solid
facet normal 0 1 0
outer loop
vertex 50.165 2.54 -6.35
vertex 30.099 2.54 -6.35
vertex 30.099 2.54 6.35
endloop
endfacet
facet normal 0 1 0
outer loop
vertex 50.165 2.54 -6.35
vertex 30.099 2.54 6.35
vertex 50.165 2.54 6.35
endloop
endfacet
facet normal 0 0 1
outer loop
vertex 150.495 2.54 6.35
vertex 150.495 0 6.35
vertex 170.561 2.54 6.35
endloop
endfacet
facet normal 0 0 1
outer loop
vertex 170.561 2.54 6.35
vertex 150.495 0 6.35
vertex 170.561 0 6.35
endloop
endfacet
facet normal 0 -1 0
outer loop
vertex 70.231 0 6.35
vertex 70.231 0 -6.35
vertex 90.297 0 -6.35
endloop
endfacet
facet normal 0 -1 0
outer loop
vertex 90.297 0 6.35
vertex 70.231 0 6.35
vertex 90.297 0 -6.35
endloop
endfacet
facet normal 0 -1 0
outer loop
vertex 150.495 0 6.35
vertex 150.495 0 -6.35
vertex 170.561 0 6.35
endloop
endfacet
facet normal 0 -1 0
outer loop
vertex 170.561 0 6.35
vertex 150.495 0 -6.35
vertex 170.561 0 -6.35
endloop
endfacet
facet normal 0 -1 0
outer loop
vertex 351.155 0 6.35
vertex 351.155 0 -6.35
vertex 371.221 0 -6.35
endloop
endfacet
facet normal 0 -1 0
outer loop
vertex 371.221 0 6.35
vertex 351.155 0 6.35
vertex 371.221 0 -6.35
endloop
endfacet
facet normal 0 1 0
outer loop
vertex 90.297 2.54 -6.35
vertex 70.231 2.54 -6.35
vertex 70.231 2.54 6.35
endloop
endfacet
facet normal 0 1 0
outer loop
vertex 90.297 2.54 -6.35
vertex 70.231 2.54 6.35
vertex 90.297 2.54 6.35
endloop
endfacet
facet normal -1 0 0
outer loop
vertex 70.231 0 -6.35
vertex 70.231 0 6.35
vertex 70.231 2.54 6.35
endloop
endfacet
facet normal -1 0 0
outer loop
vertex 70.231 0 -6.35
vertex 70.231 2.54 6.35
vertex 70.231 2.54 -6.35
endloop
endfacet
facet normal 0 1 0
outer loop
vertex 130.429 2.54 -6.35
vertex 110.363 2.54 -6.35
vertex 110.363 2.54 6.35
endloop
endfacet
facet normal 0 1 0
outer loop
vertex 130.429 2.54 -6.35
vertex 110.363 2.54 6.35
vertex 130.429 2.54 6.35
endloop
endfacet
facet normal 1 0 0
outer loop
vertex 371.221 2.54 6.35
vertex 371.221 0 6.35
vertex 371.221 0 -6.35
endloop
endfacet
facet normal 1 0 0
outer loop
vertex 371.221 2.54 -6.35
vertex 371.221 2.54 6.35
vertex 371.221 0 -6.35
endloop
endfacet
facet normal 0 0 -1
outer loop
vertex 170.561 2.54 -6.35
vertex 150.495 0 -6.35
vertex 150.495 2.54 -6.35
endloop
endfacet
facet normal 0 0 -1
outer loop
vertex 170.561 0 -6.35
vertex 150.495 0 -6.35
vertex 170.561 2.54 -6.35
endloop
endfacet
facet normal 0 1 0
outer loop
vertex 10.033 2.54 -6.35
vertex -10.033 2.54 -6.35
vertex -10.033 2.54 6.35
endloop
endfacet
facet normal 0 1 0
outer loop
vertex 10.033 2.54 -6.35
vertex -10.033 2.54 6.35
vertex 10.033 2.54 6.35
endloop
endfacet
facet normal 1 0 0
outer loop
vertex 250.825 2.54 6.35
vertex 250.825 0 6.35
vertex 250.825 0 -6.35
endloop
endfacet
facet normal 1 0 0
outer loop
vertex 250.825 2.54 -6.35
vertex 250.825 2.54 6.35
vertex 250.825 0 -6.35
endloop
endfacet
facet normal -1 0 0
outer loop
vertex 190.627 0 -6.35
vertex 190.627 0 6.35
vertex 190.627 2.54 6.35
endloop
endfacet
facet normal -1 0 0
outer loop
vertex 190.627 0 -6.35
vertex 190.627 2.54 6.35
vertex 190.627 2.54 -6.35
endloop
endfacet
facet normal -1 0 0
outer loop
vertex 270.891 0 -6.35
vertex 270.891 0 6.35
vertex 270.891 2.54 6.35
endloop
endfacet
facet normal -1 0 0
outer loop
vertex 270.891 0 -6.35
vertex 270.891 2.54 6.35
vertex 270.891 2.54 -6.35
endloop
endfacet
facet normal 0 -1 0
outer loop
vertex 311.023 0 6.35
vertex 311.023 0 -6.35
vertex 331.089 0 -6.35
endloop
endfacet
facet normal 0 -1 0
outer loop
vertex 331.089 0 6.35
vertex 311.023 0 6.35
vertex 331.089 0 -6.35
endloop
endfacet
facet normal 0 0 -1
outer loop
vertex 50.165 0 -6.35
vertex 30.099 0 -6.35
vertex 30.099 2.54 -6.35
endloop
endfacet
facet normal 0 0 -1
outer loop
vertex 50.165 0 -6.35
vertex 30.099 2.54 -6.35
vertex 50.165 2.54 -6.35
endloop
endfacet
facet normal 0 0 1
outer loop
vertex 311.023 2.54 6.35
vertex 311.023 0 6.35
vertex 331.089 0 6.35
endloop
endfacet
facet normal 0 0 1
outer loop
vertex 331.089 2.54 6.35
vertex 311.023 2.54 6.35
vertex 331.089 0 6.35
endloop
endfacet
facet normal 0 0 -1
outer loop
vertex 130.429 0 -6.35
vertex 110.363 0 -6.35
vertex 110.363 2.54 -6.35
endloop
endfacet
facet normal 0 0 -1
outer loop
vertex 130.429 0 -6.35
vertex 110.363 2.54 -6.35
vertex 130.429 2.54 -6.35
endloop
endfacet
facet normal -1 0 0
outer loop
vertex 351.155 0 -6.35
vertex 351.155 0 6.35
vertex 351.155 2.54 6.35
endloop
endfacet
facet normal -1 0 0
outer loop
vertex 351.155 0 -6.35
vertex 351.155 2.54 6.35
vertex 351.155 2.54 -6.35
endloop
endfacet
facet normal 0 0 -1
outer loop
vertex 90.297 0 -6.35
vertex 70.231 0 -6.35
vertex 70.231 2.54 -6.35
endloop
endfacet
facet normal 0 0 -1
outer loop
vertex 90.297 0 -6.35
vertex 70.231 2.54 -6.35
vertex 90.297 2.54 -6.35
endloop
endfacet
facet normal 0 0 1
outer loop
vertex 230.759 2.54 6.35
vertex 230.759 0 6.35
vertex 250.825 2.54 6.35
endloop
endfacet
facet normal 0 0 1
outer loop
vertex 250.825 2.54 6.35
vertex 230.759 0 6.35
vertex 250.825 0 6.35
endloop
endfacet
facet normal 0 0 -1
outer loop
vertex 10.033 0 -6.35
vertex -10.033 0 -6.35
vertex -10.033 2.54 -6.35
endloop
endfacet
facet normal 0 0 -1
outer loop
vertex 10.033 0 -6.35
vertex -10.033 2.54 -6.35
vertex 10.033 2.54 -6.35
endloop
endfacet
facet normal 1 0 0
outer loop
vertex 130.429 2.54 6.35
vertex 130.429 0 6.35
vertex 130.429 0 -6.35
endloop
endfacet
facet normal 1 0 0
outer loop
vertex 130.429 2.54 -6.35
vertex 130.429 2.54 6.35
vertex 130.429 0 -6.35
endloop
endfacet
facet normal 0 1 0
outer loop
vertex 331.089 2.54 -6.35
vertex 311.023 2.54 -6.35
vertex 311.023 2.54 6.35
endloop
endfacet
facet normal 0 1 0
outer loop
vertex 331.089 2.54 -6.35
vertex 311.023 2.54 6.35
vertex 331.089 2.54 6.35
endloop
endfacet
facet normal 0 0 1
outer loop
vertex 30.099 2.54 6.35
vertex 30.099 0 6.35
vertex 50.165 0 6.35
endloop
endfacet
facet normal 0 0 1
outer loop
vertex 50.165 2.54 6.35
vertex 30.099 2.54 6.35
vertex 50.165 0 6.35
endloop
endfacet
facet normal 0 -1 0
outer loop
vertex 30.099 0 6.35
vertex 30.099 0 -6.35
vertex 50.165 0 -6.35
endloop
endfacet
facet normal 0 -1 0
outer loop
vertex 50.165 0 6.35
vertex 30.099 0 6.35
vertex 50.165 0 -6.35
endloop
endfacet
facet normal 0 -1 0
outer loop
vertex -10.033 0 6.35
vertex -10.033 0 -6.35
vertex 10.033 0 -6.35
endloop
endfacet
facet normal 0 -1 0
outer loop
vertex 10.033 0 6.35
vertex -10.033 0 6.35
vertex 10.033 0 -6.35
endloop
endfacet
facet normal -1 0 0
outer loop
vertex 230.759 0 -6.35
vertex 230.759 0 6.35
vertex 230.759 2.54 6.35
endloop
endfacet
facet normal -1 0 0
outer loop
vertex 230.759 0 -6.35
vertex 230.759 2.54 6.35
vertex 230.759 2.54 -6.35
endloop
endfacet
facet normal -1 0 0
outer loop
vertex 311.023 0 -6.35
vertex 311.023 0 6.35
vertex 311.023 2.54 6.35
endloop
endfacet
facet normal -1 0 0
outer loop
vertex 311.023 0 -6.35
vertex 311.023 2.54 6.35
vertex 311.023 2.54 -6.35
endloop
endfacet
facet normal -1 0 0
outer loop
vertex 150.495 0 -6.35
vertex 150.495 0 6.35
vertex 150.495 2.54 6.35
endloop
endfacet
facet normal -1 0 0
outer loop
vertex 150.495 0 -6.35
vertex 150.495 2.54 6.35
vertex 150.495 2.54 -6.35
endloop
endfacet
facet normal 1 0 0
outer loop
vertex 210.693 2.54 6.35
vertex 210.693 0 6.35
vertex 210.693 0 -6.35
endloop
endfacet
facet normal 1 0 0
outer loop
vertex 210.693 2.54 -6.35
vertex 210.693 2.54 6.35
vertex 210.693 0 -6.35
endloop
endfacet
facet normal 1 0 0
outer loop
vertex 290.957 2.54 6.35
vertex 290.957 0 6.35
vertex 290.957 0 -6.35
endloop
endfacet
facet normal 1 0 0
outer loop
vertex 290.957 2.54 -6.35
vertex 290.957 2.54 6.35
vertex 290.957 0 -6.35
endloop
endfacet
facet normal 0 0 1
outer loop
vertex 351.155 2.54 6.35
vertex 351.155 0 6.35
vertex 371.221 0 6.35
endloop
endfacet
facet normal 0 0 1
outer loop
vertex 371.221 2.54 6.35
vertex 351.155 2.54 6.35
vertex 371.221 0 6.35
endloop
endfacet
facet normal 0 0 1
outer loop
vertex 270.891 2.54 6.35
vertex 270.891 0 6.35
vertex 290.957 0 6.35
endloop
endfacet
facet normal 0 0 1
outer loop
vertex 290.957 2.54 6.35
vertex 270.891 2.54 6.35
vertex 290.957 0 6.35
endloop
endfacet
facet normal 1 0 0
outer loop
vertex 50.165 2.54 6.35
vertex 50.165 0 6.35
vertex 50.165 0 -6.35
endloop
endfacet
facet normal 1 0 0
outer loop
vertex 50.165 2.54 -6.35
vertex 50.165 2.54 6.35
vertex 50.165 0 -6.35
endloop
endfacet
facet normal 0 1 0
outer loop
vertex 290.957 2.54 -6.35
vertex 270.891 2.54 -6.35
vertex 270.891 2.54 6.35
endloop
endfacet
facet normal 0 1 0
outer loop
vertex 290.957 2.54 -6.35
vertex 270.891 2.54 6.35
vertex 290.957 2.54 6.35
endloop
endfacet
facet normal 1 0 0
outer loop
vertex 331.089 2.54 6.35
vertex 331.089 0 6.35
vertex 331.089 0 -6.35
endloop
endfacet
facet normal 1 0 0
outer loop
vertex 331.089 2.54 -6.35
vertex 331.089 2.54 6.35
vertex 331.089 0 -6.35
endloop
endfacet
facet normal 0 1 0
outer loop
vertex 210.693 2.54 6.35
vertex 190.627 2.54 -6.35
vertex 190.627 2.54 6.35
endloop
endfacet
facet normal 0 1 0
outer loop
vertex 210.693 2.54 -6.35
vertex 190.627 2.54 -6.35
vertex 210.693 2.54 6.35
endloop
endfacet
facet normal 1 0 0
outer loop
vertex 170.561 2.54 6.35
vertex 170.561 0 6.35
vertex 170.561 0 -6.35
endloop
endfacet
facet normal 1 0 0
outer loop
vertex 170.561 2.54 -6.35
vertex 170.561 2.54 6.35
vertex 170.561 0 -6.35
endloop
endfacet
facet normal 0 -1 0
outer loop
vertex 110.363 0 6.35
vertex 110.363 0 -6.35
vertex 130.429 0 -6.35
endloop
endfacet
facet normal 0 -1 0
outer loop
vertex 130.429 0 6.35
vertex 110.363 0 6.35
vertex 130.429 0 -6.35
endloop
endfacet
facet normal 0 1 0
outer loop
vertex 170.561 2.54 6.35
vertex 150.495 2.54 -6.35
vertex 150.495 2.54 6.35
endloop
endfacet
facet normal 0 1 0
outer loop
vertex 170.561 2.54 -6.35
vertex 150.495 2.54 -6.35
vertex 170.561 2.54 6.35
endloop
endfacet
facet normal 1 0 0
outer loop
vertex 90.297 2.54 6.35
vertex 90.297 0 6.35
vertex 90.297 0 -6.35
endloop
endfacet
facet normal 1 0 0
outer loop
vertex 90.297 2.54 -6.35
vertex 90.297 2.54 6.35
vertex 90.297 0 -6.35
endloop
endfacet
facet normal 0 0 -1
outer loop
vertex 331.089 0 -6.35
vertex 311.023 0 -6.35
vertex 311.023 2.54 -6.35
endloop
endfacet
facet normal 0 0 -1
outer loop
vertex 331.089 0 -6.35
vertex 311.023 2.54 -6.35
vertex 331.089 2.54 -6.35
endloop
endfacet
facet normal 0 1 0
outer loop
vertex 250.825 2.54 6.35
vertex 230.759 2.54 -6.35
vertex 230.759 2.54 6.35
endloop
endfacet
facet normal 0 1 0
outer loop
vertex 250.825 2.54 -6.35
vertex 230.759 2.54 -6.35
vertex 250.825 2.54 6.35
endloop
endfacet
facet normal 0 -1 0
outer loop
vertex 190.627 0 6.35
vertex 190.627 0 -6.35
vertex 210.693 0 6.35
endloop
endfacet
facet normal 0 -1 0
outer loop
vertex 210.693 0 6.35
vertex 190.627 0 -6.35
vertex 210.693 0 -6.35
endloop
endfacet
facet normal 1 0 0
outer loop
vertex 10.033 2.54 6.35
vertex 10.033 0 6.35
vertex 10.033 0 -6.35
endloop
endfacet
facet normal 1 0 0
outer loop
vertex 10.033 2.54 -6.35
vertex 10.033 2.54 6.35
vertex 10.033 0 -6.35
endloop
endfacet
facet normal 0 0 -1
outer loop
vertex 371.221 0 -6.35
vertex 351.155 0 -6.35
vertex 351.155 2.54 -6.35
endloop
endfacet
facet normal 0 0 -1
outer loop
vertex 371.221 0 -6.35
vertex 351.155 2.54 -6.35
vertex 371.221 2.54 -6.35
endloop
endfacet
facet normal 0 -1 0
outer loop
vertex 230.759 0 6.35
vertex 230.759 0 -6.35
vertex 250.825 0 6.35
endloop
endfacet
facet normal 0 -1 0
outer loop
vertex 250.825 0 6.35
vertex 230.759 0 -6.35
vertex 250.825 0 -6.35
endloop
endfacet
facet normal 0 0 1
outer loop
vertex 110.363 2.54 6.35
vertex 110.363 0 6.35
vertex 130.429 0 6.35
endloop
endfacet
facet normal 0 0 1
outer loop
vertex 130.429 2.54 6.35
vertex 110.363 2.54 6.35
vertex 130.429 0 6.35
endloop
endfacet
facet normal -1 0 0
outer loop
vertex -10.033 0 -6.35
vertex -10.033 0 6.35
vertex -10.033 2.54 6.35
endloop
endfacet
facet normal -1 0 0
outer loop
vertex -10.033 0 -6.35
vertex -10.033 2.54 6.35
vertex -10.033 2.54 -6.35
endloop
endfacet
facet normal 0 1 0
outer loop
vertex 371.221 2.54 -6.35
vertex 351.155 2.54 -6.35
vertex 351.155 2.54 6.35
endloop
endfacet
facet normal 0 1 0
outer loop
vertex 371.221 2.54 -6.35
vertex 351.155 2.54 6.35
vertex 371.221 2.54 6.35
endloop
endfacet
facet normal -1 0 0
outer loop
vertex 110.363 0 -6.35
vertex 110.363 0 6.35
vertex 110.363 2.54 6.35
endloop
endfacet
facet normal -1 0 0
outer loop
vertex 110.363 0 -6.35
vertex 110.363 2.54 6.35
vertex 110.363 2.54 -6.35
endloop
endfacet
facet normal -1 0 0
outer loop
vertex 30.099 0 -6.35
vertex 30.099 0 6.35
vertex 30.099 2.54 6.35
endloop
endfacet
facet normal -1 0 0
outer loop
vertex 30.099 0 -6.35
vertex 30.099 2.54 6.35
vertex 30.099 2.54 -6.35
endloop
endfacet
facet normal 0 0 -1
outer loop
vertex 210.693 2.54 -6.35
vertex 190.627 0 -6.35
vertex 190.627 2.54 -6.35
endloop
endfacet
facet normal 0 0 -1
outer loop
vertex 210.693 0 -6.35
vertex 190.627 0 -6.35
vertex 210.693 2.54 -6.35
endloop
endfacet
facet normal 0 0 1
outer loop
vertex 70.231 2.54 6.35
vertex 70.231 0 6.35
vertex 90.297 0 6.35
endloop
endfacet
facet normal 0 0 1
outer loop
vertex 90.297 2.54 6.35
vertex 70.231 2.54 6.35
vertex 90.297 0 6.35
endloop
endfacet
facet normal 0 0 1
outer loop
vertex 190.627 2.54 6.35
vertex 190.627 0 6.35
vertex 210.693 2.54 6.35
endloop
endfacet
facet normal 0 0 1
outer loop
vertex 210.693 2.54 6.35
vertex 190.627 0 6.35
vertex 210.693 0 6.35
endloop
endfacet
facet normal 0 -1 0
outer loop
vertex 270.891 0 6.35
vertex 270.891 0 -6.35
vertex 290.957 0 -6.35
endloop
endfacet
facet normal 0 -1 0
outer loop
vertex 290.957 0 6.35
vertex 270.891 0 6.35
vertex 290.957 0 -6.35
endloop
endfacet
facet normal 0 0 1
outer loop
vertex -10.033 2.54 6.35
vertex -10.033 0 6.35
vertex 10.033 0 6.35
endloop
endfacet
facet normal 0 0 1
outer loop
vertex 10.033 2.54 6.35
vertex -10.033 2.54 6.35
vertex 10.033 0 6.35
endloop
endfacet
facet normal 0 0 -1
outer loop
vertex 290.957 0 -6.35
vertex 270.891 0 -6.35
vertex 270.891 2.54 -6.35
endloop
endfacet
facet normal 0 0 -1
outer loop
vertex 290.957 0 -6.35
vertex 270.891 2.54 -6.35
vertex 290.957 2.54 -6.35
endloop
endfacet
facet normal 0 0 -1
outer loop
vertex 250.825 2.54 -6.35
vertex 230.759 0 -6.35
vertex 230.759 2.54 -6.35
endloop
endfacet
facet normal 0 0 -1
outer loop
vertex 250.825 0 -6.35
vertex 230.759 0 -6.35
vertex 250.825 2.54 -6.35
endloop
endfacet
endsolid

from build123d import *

# Parameters (mm, degrees)
SKETCH1_W              = 20.066
SKETCH1_H              = 12.7
BOSS_EXTRUDE1_DEPTH    = 2.54
BOSS_EXTRUDE1_2_DEPTH  = 2.54
BOSS_EXTRUDE1_3_DEPTH  = 2.54
BOSS_EXTRUDE1_4_DEPTH  = 2.54
BOSS_EXTRUDE1_5_DEPTH  = 2.54
BOSS_EXTRUDE1_6_DEPTH  = 2.54
BOSS_EXTRUDE1_7_DEPTH  = 2.54
BOSS_EXTRUDE1_8_DEPTH  = 2.54
BOSS_EXTRUDE1_9_DEPTH  = 2.54
BOSS_EXTRUDE1_10_DEPTH = 2.54


with BuildPart() as part:
    # Sketch1 → Boss-Extrude1 (new body)
    with BuildSketch(Plane(origin=(0, 0, 0), x_dir=(1, 0, 0), z_dir=(0, 1, 0))):
        with Locations((40.132, 0)):
            Rectangle(SKETCH1_W, SKETCH1_H)
    extrude(amount=BOSS_EXTRUDE1_DEPTH)


with BuildPart() as body_2:
    # Sketch1 → Boss-Extrude1 2 (new body)
    with BuildSketch(Plane(origin=(0, 0, 0), x_dir=(1, 0, 0), z_dir=(0, 1, 0))):
        Rectangle(SKETCH1_W, SKETCH1_H)
    extrude(amount=BOSS_EXTRUDE1_2_DEPTH)


with BuildPart() as body_3:
    # Sketch1 → Boss-Extrude1 3 (new body)
    with BuildSketch(Plane(origin=(0, 0, 0), x_dir=(1, 0, 0), z_dir=(0, 1, 0))):
        with Locations((80.264, 0)):
            Rectangle(SKETCH1_W, SKETCH1_H)
    extrude(amount=BOSS_EXTRUDE1_3_DEPTH)


with BuildPart() as body_4:
    # Sketch1 → Boss-Extrude1 4 (new body)
    with BuildSketch(Plane(origin=(0, 0, 0), x_dir=(1, 0, 0), z_dir=(0, 1, 0))):
        with Locations((120.396, 0)):
            Rectangle(SKETCH1_W, SKETCH1_H)
    extrude(amount=BOSS_EXTRUDE1_4_DEPTH)


with BuildPart() as body_5:
    # Sketch1 → Boss-Extrude1 5 (new body)
    with BuildSketch(Plane(origin=(0, 0, 0), x_dir=(1, 0, 0), z_dir=(0, 1, 0))):
        with Locations((160.528, 0)):
            Rectangle(SKETCH1_W, SKETCH1_H)
    extrude(amount=BOSS_EXTRUDE1_5_DEPTH)


with BuildPart() as body_6:
    # Sketch1 → Boss-Extrude1 6 (new body)
    with BuildSketch(Plane(origin=(0, 0, 0), x_dir=(1, 0, 0), z_dir=(0, 1, 0))):
        with Locations((200.66, 0)):
            Rectangle(SKETCH1_W, SKETCH1_H)
    extrude(amount=BOSS_EXTRUDE1_6_DEPTH)


with BuildPart() as body_7:
    # Sketch1 → Boss-Extrude1 7 (new body)
    with BuildSketch(Plane(origin=(0, 0, 0), x_dir=(1, 0, 0), z_dir=(0, 1, 0))):
        with Locations((240.792, 0)):
            Rectangle(SKETCH1_W, SKETCH1_H)
    extrude(amount=BOSS_EXTRUDE1_7_DEPTH)


with BuildPart() as body_8:
    # Sketch1 → Boss-Extrude1 8 (new body)
    with BuildSketch(Plane(origin=(0, 0, 0), x_dir=(1, 0, 0), z_dir=(0, 1, 0))):
        with Locations((280.924, 0)):
            Rectangle(SKETCH1_W, SKETCH1_H)
    extrude(amount=BOSS_EXTRUDE1_8_DEPTH)


with BuildPart() as body_9:
    # Sketch1 → Boss-Extrude1 9 (new body)
    with BuildSketch(Plane(origin=(0, 0, 0), x_dir=(1, 0, 0), z_dir=(0, 1, 0))):
        with Locations((321.056, 0)):
            Rectangle(SKETCH1_W, SKETCH1_H)
    extrude(amount=BOSS_EXTRUDE1_9_DEPTH)


with BuildPart() as body_10:
    # Sketch1 → Boss-Extrude1 10 (new body)
    with BuildSketch(Plane(origin=(0, 0, 0), x_dir=(1, 0, 0), z_dir=(0, 1, 0))):
        with Locations((361.188, 0)):
            Rectangle(SKETCH1_W, SKETCH1_H)
    extrude(amount=BOSS_EXTRUDE1_10_DEPTH)


solid = Compound([part.part, body_2.part, body_3.part, body_4.part, body_5.part, body_6.part, body_7.part, body_8.part, body_9.part, body_10.part])
